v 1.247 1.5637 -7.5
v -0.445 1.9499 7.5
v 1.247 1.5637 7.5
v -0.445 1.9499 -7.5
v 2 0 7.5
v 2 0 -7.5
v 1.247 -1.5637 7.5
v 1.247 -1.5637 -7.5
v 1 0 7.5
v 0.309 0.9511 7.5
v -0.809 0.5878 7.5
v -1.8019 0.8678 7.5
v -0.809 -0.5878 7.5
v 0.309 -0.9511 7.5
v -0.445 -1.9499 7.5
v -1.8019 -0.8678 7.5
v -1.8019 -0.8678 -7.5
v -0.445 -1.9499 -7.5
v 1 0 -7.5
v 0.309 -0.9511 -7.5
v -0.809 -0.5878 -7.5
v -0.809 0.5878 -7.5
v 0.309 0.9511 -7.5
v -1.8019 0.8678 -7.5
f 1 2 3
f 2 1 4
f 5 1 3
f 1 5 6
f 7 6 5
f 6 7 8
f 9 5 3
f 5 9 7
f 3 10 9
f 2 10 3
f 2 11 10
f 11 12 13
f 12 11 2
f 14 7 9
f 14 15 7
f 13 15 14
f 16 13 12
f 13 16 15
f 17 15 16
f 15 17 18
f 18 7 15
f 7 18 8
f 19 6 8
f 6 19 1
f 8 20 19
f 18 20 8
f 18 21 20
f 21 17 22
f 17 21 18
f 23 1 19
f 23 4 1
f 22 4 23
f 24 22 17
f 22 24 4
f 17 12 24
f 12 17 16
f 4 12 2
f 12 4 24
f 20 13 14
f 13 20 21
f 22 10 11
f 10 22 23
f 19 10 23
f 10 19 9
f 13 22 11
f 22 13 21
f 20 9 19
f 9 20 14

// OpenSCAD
// Parameters
length = 15; //[8:30:1]
center = 1; //[0:1:1]
forced_id = 0; //[0:10:0.1]
standard_od = 4; //[2:8:0.1]
standard_id = 2; //[1:6:0.1]
id = 2; //[1:10:0.1]
od = 4; //[2:12:0.1]
eps_overlap = 0.8; //[0.2:2:0.1]

// Tubing - complete geometry
module tubing() {
  color([0.85, 0.85, 0.8]) { // PTFE color
    if (center) {
      difference() {
        // Outer cylinder
        cylinder(r=od/2, h=length, center=true);
        // Inner cylinder
        cylinder(r=((forced_id>0)?forced_id:standard_id)/2, h=length + 2*eps_overlap, center=true);
      }
    } else {
      difference() {
        // Outer cylinder
        translate([0, 0, length/2])
          cylinder(r=od/2, h=length, center=true);
        // Inner cylinder
        translate([0, 0, length/2])
          cylinder(r=((forced_id>0)?forced_id:standard_id)/2, h=length + 2*eps_overlap, center=true);
      }
    }
  }
}

// Assembly
module assembly() {
  tubing();
}

assembly();
